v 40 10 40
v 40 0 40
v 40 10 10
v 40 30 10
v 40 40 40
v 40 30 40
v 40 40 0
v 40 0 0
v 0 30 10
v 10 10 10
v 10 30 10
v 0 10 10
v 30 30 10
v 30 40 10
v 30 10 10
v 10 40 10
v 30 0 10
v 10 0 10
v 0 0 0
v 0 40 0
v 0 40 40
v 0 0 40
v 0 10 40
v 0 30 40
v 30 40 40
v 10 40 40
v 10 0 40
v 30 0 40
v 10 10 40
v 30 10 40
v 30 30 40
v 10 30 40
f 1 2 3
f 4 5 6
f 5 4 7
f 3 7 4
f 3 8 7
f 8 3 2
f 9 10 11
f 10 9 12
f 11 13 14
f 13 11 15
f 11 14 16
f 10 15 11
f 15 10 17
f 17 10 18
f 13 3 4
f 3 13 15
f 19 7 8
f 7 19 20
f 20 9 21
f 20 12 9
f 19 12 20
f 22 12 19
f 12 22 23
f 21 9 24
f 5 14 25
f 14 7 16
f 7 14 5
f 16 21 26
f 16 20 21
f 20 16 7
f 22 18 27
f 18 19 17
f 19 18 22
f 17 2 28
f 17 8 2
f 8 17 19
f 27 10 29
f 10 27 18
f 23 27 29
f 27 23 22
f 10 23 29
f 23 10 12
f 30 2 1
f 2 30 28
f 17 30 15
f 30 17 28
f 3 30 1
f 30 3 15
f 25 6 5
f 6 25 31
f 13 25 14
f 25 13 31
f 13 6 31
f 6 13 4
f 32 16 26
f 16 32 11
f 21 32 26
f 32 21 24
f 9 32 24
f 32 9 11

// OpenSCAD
cube([40, 40, 10], center=false);
cube([10, 10, 40], center=false);
translate([30,0,0])
cube([10, 10, 40], center=false);
translate([30,30,0])
cube([10, 10, 40], center=false);
translate([0,30,0])
cube([10, 10, 40], center=false);
